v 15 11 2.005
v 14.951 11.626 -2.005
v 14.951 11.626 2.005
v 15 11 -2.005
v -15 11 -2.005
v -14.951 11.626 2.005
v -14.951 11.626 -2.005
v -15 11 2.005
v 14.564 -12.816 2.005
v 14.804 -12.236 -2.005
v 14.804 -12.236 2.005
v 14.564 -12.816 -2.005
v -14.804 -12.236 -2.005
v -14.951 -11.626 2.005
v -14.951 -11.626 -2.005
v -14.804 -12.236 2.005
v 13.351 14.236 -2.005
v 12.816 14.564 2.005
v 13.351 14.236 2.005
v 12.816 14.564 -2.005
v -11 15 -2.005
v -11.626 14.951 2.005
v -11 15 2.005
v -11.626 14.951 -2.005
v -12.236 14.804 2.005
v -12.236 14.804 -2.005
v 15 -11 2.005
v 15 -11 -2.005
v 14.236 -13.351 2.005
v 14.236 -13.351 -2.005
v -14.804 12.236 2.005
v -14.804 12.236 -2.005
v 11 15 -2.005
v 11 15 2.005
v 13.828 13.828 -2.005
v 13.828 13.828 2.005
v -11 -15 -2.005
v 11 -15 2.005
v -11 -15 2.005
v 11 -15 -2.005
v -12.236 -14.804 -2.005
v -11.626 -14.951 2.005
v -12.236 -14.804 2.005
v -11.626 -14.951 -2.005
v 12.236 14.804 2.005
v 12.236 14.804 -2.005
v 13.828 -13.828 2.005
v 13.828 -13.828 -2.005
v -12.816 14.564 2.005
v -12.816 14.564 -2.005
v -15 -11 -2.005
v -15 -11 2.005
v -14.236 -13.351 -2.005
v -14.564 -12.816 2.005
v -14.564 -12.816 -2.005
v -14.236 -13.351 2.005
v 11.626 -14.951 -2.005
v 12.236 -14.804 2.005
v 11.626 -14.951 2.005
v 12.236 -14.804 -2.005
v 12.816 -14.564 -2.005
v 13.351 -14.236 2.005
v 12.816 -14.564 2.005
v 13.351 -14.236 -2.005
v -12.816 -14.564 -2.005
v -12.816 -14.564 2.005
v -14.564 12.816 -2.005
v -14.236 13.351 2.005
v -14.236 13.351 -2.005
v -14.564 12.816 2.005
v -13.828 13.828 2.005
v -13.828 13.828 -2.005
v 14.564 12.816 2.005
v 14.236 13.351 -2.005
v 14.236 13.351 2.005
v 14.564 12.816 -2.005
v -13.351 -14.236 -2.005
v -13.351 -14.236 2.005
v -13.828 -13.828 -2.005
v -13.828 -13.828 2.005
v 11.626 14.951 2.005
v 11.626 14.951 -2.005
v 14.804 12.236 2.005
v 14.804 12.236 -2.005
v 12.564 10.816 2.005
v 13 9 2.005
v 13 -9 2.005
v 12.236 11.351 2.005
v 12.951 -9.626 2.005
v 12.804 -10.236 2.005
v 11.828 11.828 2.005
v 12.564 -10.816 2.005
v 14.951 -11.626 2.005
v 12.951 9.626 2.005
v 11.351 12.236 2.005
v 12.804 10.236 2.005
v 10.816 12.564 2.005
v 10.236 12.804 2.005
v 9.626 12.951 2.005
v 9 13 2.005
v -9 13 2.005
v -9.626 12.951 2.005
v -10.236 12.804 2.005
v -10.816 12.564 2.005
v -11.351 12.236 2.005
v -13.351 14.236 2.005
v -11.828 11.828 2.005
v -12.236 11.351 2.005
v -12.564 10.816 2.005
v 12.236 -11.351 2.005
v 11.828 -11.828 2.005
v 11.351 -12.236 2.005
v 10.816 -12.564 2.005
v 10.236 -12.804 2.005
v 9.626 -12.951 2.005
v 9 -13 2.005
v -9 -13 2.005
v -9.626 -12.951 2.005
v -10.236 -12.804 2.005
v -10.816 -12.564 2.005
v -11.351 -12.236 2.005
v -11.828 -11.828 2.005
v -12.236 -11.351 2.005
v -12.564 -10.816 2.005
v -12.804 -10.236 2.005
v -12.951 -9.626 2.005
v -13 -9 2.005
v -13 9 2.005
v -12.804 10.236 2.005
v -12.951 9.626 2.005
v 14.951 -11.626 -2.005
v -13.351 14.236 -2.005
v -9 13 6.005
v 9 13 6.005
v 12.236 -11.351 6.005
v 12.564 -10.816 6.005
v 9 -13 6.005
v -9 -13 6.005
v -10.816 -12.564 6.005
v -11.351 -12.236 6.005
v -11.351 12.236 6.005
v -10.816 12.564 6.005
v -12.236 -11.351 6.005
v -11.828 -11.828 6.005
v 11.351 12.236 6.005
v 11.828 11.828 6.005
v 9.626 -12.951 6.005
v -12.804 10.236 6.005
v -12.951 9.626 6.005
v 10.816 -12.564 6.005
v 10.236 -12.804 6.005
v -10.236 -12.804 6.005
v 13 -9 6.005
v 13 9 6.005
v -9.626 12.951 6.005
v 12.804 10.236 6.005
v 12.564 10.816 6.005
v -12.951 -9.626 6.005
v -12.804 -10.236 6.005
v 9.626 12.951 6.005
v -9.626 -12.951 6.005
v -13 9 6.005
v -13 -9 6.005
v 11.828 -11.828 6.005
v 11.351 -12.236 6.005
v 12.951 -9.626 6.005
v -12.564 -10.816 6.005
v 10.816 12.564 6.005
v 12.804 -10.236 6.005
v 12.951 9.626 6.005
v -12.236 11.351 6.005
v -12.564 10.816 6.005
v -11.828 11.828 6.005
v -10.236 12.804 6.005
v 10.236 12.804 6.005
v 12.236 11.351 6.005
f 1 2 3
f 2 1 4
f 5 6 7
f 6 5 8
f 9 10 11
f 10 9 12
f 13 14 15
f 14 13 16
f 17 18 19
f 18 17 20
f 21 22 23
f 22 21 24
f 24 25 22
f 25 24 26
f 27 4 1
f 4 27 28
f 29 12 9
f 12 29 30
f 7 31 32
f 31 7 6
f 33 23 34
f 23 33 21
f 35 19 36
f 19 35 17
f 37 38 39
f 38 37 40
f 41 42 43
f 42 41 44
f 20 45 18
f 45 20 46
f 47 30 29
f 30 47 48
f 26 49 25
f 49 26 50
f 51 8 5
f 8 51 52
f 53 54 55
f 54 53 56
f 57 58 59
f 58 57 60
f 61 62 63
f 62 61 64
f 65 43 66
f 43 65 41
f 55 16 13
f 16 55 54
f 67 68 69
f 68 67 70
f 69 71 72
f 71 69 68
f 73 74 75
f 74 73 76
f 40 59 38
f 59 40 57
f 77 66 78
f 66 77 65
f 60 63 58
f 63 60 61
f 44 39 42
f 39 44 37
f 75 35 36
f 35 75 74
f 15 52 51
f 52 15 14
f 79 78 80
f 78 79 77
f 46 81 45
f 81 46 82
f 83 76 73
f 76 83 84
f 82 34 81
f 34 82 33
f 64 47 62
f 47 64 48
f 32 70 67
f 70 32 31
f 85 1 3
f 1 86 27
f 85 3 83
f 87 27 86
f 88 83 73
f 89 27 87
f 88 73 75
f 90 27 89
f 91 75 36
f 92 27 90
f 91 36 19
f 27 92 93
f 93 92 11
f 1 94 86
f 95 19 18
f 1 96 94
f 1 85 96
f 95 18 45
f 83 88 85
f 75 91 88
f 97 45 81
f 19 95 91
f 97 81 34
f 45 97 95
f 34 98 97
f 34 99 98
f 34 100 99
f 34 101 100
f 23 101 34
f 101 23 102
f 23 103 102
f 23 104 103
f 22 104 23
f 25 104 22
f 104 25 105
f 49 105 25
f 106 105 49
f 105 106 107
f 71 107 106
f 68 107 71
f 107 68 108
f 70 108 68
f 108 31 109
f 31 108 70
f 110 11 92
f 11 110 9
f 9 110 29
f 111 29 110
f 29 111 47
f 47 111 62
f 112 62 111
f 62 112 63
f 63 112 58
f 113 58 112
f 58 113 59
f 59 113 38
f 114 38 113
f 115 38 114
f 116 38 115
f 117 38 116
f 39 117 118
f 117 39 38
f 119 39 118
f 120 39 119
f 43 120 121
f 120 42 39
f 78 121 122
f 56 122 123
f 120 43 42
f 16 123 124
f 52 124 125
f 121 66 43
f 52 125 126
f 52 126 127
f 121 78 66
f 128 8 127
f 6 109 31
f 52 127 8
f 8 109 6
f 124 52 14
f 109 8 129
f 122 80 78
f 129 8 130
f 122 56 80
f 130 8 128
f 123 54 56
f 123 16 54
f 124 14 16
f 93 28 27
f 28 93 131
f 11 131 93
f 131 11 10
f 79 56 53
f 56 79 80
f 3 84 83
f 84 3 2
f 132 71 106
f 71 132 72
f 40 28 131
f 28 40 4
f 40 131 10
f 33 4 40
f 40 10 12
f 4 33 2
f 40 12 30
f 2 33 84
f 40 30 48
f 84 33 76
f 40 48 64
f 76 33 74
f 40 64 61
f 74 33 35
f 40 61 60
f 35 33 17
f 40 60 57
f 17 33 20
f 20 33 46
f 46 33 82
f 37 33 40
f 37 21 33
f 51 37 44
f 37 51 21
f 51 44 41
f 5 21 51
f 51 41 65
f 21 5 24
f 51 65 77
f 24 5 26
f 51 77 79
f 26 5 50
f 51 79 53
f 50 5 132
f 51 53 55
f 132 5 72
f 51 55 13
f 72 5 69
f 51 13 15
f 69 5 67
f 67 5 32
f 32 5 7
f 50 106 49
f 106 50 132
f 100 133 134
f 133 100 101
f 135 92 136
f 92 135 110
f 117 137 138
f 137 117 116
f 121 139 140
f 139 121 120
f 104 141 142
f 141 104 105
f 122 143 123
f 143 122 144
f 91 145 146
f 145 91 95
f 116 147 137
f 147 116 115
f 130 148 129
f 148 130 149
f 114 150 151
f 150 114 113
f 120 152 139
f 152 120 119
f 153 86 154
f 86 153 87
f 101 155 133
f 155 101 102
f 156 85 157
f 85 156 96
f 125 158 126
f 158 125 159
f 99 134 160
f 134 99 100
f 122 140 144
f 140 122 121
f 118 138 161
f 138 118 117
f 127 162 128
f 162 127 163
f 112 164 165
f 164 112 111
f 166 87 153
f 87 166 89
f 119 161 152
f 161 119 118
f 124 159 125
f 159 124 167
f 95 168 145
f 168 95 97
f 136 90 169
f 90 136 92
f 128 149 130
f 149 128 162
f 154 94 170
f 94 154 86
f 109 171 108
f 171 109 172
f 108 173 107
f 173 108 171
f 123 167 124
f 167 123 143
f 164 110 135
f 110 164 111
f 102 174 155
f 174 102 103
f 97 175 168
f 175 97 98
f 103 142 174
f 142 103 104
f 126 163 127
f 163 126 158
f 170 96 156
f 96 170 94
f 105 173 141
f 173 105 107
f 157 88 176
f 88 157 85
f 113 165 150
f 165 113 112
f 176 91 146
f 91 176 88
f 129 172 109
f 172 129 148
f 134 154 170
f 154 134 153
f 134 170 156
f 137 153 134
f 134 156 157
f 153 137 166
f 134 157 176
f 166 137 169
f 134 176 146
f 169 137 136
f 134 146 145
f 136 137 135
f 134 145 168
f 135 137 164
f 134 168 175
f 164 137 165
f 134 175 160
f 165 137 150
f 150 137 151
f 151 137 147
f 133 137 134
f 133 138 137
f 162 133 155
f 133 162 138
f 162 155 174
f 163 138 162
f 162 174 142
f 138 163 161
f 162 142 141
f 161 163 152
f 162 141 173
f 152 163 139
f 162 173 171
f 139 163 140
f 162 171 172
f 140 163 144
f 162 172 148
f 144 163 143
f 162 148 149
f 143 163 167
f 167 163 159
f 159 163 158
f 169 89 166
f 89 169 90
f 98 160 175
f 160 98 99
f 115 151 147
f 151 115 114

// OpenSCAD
// paramètres
width = 30; //[1:1:40]
length = 30; //[1:1:40]
baseHeight = 4; //[1:1:11]
buttonHeight = 3;
borderThickness = 2;
cornerRadius = 4;
detail = 40;

$fn = detail; // niveau détail

// module bouton
module floorButton(w, l, hBase, hButton, border, r)
{
    // base
    color("gray")
    roundedBox(w, l, hBase, r);

    // surface bouton
    color("red")
    translate([0, 0, 4])
    roundedBox(w - 2*border, l - 2*border, hButton+1, r/1);
}

// boîte arrondie simple
module roundedBox(w, l, h, r)
{
    minkowski()
    {
        cube([w - 2*r, l - 2*r, h], center = true);
        cylinder(r = r, h = 0.01, center = true);
    }
}

// affichage
floorButton(width, length, baseHeight, buttonHeight, borderThickness, cornerRadius);
